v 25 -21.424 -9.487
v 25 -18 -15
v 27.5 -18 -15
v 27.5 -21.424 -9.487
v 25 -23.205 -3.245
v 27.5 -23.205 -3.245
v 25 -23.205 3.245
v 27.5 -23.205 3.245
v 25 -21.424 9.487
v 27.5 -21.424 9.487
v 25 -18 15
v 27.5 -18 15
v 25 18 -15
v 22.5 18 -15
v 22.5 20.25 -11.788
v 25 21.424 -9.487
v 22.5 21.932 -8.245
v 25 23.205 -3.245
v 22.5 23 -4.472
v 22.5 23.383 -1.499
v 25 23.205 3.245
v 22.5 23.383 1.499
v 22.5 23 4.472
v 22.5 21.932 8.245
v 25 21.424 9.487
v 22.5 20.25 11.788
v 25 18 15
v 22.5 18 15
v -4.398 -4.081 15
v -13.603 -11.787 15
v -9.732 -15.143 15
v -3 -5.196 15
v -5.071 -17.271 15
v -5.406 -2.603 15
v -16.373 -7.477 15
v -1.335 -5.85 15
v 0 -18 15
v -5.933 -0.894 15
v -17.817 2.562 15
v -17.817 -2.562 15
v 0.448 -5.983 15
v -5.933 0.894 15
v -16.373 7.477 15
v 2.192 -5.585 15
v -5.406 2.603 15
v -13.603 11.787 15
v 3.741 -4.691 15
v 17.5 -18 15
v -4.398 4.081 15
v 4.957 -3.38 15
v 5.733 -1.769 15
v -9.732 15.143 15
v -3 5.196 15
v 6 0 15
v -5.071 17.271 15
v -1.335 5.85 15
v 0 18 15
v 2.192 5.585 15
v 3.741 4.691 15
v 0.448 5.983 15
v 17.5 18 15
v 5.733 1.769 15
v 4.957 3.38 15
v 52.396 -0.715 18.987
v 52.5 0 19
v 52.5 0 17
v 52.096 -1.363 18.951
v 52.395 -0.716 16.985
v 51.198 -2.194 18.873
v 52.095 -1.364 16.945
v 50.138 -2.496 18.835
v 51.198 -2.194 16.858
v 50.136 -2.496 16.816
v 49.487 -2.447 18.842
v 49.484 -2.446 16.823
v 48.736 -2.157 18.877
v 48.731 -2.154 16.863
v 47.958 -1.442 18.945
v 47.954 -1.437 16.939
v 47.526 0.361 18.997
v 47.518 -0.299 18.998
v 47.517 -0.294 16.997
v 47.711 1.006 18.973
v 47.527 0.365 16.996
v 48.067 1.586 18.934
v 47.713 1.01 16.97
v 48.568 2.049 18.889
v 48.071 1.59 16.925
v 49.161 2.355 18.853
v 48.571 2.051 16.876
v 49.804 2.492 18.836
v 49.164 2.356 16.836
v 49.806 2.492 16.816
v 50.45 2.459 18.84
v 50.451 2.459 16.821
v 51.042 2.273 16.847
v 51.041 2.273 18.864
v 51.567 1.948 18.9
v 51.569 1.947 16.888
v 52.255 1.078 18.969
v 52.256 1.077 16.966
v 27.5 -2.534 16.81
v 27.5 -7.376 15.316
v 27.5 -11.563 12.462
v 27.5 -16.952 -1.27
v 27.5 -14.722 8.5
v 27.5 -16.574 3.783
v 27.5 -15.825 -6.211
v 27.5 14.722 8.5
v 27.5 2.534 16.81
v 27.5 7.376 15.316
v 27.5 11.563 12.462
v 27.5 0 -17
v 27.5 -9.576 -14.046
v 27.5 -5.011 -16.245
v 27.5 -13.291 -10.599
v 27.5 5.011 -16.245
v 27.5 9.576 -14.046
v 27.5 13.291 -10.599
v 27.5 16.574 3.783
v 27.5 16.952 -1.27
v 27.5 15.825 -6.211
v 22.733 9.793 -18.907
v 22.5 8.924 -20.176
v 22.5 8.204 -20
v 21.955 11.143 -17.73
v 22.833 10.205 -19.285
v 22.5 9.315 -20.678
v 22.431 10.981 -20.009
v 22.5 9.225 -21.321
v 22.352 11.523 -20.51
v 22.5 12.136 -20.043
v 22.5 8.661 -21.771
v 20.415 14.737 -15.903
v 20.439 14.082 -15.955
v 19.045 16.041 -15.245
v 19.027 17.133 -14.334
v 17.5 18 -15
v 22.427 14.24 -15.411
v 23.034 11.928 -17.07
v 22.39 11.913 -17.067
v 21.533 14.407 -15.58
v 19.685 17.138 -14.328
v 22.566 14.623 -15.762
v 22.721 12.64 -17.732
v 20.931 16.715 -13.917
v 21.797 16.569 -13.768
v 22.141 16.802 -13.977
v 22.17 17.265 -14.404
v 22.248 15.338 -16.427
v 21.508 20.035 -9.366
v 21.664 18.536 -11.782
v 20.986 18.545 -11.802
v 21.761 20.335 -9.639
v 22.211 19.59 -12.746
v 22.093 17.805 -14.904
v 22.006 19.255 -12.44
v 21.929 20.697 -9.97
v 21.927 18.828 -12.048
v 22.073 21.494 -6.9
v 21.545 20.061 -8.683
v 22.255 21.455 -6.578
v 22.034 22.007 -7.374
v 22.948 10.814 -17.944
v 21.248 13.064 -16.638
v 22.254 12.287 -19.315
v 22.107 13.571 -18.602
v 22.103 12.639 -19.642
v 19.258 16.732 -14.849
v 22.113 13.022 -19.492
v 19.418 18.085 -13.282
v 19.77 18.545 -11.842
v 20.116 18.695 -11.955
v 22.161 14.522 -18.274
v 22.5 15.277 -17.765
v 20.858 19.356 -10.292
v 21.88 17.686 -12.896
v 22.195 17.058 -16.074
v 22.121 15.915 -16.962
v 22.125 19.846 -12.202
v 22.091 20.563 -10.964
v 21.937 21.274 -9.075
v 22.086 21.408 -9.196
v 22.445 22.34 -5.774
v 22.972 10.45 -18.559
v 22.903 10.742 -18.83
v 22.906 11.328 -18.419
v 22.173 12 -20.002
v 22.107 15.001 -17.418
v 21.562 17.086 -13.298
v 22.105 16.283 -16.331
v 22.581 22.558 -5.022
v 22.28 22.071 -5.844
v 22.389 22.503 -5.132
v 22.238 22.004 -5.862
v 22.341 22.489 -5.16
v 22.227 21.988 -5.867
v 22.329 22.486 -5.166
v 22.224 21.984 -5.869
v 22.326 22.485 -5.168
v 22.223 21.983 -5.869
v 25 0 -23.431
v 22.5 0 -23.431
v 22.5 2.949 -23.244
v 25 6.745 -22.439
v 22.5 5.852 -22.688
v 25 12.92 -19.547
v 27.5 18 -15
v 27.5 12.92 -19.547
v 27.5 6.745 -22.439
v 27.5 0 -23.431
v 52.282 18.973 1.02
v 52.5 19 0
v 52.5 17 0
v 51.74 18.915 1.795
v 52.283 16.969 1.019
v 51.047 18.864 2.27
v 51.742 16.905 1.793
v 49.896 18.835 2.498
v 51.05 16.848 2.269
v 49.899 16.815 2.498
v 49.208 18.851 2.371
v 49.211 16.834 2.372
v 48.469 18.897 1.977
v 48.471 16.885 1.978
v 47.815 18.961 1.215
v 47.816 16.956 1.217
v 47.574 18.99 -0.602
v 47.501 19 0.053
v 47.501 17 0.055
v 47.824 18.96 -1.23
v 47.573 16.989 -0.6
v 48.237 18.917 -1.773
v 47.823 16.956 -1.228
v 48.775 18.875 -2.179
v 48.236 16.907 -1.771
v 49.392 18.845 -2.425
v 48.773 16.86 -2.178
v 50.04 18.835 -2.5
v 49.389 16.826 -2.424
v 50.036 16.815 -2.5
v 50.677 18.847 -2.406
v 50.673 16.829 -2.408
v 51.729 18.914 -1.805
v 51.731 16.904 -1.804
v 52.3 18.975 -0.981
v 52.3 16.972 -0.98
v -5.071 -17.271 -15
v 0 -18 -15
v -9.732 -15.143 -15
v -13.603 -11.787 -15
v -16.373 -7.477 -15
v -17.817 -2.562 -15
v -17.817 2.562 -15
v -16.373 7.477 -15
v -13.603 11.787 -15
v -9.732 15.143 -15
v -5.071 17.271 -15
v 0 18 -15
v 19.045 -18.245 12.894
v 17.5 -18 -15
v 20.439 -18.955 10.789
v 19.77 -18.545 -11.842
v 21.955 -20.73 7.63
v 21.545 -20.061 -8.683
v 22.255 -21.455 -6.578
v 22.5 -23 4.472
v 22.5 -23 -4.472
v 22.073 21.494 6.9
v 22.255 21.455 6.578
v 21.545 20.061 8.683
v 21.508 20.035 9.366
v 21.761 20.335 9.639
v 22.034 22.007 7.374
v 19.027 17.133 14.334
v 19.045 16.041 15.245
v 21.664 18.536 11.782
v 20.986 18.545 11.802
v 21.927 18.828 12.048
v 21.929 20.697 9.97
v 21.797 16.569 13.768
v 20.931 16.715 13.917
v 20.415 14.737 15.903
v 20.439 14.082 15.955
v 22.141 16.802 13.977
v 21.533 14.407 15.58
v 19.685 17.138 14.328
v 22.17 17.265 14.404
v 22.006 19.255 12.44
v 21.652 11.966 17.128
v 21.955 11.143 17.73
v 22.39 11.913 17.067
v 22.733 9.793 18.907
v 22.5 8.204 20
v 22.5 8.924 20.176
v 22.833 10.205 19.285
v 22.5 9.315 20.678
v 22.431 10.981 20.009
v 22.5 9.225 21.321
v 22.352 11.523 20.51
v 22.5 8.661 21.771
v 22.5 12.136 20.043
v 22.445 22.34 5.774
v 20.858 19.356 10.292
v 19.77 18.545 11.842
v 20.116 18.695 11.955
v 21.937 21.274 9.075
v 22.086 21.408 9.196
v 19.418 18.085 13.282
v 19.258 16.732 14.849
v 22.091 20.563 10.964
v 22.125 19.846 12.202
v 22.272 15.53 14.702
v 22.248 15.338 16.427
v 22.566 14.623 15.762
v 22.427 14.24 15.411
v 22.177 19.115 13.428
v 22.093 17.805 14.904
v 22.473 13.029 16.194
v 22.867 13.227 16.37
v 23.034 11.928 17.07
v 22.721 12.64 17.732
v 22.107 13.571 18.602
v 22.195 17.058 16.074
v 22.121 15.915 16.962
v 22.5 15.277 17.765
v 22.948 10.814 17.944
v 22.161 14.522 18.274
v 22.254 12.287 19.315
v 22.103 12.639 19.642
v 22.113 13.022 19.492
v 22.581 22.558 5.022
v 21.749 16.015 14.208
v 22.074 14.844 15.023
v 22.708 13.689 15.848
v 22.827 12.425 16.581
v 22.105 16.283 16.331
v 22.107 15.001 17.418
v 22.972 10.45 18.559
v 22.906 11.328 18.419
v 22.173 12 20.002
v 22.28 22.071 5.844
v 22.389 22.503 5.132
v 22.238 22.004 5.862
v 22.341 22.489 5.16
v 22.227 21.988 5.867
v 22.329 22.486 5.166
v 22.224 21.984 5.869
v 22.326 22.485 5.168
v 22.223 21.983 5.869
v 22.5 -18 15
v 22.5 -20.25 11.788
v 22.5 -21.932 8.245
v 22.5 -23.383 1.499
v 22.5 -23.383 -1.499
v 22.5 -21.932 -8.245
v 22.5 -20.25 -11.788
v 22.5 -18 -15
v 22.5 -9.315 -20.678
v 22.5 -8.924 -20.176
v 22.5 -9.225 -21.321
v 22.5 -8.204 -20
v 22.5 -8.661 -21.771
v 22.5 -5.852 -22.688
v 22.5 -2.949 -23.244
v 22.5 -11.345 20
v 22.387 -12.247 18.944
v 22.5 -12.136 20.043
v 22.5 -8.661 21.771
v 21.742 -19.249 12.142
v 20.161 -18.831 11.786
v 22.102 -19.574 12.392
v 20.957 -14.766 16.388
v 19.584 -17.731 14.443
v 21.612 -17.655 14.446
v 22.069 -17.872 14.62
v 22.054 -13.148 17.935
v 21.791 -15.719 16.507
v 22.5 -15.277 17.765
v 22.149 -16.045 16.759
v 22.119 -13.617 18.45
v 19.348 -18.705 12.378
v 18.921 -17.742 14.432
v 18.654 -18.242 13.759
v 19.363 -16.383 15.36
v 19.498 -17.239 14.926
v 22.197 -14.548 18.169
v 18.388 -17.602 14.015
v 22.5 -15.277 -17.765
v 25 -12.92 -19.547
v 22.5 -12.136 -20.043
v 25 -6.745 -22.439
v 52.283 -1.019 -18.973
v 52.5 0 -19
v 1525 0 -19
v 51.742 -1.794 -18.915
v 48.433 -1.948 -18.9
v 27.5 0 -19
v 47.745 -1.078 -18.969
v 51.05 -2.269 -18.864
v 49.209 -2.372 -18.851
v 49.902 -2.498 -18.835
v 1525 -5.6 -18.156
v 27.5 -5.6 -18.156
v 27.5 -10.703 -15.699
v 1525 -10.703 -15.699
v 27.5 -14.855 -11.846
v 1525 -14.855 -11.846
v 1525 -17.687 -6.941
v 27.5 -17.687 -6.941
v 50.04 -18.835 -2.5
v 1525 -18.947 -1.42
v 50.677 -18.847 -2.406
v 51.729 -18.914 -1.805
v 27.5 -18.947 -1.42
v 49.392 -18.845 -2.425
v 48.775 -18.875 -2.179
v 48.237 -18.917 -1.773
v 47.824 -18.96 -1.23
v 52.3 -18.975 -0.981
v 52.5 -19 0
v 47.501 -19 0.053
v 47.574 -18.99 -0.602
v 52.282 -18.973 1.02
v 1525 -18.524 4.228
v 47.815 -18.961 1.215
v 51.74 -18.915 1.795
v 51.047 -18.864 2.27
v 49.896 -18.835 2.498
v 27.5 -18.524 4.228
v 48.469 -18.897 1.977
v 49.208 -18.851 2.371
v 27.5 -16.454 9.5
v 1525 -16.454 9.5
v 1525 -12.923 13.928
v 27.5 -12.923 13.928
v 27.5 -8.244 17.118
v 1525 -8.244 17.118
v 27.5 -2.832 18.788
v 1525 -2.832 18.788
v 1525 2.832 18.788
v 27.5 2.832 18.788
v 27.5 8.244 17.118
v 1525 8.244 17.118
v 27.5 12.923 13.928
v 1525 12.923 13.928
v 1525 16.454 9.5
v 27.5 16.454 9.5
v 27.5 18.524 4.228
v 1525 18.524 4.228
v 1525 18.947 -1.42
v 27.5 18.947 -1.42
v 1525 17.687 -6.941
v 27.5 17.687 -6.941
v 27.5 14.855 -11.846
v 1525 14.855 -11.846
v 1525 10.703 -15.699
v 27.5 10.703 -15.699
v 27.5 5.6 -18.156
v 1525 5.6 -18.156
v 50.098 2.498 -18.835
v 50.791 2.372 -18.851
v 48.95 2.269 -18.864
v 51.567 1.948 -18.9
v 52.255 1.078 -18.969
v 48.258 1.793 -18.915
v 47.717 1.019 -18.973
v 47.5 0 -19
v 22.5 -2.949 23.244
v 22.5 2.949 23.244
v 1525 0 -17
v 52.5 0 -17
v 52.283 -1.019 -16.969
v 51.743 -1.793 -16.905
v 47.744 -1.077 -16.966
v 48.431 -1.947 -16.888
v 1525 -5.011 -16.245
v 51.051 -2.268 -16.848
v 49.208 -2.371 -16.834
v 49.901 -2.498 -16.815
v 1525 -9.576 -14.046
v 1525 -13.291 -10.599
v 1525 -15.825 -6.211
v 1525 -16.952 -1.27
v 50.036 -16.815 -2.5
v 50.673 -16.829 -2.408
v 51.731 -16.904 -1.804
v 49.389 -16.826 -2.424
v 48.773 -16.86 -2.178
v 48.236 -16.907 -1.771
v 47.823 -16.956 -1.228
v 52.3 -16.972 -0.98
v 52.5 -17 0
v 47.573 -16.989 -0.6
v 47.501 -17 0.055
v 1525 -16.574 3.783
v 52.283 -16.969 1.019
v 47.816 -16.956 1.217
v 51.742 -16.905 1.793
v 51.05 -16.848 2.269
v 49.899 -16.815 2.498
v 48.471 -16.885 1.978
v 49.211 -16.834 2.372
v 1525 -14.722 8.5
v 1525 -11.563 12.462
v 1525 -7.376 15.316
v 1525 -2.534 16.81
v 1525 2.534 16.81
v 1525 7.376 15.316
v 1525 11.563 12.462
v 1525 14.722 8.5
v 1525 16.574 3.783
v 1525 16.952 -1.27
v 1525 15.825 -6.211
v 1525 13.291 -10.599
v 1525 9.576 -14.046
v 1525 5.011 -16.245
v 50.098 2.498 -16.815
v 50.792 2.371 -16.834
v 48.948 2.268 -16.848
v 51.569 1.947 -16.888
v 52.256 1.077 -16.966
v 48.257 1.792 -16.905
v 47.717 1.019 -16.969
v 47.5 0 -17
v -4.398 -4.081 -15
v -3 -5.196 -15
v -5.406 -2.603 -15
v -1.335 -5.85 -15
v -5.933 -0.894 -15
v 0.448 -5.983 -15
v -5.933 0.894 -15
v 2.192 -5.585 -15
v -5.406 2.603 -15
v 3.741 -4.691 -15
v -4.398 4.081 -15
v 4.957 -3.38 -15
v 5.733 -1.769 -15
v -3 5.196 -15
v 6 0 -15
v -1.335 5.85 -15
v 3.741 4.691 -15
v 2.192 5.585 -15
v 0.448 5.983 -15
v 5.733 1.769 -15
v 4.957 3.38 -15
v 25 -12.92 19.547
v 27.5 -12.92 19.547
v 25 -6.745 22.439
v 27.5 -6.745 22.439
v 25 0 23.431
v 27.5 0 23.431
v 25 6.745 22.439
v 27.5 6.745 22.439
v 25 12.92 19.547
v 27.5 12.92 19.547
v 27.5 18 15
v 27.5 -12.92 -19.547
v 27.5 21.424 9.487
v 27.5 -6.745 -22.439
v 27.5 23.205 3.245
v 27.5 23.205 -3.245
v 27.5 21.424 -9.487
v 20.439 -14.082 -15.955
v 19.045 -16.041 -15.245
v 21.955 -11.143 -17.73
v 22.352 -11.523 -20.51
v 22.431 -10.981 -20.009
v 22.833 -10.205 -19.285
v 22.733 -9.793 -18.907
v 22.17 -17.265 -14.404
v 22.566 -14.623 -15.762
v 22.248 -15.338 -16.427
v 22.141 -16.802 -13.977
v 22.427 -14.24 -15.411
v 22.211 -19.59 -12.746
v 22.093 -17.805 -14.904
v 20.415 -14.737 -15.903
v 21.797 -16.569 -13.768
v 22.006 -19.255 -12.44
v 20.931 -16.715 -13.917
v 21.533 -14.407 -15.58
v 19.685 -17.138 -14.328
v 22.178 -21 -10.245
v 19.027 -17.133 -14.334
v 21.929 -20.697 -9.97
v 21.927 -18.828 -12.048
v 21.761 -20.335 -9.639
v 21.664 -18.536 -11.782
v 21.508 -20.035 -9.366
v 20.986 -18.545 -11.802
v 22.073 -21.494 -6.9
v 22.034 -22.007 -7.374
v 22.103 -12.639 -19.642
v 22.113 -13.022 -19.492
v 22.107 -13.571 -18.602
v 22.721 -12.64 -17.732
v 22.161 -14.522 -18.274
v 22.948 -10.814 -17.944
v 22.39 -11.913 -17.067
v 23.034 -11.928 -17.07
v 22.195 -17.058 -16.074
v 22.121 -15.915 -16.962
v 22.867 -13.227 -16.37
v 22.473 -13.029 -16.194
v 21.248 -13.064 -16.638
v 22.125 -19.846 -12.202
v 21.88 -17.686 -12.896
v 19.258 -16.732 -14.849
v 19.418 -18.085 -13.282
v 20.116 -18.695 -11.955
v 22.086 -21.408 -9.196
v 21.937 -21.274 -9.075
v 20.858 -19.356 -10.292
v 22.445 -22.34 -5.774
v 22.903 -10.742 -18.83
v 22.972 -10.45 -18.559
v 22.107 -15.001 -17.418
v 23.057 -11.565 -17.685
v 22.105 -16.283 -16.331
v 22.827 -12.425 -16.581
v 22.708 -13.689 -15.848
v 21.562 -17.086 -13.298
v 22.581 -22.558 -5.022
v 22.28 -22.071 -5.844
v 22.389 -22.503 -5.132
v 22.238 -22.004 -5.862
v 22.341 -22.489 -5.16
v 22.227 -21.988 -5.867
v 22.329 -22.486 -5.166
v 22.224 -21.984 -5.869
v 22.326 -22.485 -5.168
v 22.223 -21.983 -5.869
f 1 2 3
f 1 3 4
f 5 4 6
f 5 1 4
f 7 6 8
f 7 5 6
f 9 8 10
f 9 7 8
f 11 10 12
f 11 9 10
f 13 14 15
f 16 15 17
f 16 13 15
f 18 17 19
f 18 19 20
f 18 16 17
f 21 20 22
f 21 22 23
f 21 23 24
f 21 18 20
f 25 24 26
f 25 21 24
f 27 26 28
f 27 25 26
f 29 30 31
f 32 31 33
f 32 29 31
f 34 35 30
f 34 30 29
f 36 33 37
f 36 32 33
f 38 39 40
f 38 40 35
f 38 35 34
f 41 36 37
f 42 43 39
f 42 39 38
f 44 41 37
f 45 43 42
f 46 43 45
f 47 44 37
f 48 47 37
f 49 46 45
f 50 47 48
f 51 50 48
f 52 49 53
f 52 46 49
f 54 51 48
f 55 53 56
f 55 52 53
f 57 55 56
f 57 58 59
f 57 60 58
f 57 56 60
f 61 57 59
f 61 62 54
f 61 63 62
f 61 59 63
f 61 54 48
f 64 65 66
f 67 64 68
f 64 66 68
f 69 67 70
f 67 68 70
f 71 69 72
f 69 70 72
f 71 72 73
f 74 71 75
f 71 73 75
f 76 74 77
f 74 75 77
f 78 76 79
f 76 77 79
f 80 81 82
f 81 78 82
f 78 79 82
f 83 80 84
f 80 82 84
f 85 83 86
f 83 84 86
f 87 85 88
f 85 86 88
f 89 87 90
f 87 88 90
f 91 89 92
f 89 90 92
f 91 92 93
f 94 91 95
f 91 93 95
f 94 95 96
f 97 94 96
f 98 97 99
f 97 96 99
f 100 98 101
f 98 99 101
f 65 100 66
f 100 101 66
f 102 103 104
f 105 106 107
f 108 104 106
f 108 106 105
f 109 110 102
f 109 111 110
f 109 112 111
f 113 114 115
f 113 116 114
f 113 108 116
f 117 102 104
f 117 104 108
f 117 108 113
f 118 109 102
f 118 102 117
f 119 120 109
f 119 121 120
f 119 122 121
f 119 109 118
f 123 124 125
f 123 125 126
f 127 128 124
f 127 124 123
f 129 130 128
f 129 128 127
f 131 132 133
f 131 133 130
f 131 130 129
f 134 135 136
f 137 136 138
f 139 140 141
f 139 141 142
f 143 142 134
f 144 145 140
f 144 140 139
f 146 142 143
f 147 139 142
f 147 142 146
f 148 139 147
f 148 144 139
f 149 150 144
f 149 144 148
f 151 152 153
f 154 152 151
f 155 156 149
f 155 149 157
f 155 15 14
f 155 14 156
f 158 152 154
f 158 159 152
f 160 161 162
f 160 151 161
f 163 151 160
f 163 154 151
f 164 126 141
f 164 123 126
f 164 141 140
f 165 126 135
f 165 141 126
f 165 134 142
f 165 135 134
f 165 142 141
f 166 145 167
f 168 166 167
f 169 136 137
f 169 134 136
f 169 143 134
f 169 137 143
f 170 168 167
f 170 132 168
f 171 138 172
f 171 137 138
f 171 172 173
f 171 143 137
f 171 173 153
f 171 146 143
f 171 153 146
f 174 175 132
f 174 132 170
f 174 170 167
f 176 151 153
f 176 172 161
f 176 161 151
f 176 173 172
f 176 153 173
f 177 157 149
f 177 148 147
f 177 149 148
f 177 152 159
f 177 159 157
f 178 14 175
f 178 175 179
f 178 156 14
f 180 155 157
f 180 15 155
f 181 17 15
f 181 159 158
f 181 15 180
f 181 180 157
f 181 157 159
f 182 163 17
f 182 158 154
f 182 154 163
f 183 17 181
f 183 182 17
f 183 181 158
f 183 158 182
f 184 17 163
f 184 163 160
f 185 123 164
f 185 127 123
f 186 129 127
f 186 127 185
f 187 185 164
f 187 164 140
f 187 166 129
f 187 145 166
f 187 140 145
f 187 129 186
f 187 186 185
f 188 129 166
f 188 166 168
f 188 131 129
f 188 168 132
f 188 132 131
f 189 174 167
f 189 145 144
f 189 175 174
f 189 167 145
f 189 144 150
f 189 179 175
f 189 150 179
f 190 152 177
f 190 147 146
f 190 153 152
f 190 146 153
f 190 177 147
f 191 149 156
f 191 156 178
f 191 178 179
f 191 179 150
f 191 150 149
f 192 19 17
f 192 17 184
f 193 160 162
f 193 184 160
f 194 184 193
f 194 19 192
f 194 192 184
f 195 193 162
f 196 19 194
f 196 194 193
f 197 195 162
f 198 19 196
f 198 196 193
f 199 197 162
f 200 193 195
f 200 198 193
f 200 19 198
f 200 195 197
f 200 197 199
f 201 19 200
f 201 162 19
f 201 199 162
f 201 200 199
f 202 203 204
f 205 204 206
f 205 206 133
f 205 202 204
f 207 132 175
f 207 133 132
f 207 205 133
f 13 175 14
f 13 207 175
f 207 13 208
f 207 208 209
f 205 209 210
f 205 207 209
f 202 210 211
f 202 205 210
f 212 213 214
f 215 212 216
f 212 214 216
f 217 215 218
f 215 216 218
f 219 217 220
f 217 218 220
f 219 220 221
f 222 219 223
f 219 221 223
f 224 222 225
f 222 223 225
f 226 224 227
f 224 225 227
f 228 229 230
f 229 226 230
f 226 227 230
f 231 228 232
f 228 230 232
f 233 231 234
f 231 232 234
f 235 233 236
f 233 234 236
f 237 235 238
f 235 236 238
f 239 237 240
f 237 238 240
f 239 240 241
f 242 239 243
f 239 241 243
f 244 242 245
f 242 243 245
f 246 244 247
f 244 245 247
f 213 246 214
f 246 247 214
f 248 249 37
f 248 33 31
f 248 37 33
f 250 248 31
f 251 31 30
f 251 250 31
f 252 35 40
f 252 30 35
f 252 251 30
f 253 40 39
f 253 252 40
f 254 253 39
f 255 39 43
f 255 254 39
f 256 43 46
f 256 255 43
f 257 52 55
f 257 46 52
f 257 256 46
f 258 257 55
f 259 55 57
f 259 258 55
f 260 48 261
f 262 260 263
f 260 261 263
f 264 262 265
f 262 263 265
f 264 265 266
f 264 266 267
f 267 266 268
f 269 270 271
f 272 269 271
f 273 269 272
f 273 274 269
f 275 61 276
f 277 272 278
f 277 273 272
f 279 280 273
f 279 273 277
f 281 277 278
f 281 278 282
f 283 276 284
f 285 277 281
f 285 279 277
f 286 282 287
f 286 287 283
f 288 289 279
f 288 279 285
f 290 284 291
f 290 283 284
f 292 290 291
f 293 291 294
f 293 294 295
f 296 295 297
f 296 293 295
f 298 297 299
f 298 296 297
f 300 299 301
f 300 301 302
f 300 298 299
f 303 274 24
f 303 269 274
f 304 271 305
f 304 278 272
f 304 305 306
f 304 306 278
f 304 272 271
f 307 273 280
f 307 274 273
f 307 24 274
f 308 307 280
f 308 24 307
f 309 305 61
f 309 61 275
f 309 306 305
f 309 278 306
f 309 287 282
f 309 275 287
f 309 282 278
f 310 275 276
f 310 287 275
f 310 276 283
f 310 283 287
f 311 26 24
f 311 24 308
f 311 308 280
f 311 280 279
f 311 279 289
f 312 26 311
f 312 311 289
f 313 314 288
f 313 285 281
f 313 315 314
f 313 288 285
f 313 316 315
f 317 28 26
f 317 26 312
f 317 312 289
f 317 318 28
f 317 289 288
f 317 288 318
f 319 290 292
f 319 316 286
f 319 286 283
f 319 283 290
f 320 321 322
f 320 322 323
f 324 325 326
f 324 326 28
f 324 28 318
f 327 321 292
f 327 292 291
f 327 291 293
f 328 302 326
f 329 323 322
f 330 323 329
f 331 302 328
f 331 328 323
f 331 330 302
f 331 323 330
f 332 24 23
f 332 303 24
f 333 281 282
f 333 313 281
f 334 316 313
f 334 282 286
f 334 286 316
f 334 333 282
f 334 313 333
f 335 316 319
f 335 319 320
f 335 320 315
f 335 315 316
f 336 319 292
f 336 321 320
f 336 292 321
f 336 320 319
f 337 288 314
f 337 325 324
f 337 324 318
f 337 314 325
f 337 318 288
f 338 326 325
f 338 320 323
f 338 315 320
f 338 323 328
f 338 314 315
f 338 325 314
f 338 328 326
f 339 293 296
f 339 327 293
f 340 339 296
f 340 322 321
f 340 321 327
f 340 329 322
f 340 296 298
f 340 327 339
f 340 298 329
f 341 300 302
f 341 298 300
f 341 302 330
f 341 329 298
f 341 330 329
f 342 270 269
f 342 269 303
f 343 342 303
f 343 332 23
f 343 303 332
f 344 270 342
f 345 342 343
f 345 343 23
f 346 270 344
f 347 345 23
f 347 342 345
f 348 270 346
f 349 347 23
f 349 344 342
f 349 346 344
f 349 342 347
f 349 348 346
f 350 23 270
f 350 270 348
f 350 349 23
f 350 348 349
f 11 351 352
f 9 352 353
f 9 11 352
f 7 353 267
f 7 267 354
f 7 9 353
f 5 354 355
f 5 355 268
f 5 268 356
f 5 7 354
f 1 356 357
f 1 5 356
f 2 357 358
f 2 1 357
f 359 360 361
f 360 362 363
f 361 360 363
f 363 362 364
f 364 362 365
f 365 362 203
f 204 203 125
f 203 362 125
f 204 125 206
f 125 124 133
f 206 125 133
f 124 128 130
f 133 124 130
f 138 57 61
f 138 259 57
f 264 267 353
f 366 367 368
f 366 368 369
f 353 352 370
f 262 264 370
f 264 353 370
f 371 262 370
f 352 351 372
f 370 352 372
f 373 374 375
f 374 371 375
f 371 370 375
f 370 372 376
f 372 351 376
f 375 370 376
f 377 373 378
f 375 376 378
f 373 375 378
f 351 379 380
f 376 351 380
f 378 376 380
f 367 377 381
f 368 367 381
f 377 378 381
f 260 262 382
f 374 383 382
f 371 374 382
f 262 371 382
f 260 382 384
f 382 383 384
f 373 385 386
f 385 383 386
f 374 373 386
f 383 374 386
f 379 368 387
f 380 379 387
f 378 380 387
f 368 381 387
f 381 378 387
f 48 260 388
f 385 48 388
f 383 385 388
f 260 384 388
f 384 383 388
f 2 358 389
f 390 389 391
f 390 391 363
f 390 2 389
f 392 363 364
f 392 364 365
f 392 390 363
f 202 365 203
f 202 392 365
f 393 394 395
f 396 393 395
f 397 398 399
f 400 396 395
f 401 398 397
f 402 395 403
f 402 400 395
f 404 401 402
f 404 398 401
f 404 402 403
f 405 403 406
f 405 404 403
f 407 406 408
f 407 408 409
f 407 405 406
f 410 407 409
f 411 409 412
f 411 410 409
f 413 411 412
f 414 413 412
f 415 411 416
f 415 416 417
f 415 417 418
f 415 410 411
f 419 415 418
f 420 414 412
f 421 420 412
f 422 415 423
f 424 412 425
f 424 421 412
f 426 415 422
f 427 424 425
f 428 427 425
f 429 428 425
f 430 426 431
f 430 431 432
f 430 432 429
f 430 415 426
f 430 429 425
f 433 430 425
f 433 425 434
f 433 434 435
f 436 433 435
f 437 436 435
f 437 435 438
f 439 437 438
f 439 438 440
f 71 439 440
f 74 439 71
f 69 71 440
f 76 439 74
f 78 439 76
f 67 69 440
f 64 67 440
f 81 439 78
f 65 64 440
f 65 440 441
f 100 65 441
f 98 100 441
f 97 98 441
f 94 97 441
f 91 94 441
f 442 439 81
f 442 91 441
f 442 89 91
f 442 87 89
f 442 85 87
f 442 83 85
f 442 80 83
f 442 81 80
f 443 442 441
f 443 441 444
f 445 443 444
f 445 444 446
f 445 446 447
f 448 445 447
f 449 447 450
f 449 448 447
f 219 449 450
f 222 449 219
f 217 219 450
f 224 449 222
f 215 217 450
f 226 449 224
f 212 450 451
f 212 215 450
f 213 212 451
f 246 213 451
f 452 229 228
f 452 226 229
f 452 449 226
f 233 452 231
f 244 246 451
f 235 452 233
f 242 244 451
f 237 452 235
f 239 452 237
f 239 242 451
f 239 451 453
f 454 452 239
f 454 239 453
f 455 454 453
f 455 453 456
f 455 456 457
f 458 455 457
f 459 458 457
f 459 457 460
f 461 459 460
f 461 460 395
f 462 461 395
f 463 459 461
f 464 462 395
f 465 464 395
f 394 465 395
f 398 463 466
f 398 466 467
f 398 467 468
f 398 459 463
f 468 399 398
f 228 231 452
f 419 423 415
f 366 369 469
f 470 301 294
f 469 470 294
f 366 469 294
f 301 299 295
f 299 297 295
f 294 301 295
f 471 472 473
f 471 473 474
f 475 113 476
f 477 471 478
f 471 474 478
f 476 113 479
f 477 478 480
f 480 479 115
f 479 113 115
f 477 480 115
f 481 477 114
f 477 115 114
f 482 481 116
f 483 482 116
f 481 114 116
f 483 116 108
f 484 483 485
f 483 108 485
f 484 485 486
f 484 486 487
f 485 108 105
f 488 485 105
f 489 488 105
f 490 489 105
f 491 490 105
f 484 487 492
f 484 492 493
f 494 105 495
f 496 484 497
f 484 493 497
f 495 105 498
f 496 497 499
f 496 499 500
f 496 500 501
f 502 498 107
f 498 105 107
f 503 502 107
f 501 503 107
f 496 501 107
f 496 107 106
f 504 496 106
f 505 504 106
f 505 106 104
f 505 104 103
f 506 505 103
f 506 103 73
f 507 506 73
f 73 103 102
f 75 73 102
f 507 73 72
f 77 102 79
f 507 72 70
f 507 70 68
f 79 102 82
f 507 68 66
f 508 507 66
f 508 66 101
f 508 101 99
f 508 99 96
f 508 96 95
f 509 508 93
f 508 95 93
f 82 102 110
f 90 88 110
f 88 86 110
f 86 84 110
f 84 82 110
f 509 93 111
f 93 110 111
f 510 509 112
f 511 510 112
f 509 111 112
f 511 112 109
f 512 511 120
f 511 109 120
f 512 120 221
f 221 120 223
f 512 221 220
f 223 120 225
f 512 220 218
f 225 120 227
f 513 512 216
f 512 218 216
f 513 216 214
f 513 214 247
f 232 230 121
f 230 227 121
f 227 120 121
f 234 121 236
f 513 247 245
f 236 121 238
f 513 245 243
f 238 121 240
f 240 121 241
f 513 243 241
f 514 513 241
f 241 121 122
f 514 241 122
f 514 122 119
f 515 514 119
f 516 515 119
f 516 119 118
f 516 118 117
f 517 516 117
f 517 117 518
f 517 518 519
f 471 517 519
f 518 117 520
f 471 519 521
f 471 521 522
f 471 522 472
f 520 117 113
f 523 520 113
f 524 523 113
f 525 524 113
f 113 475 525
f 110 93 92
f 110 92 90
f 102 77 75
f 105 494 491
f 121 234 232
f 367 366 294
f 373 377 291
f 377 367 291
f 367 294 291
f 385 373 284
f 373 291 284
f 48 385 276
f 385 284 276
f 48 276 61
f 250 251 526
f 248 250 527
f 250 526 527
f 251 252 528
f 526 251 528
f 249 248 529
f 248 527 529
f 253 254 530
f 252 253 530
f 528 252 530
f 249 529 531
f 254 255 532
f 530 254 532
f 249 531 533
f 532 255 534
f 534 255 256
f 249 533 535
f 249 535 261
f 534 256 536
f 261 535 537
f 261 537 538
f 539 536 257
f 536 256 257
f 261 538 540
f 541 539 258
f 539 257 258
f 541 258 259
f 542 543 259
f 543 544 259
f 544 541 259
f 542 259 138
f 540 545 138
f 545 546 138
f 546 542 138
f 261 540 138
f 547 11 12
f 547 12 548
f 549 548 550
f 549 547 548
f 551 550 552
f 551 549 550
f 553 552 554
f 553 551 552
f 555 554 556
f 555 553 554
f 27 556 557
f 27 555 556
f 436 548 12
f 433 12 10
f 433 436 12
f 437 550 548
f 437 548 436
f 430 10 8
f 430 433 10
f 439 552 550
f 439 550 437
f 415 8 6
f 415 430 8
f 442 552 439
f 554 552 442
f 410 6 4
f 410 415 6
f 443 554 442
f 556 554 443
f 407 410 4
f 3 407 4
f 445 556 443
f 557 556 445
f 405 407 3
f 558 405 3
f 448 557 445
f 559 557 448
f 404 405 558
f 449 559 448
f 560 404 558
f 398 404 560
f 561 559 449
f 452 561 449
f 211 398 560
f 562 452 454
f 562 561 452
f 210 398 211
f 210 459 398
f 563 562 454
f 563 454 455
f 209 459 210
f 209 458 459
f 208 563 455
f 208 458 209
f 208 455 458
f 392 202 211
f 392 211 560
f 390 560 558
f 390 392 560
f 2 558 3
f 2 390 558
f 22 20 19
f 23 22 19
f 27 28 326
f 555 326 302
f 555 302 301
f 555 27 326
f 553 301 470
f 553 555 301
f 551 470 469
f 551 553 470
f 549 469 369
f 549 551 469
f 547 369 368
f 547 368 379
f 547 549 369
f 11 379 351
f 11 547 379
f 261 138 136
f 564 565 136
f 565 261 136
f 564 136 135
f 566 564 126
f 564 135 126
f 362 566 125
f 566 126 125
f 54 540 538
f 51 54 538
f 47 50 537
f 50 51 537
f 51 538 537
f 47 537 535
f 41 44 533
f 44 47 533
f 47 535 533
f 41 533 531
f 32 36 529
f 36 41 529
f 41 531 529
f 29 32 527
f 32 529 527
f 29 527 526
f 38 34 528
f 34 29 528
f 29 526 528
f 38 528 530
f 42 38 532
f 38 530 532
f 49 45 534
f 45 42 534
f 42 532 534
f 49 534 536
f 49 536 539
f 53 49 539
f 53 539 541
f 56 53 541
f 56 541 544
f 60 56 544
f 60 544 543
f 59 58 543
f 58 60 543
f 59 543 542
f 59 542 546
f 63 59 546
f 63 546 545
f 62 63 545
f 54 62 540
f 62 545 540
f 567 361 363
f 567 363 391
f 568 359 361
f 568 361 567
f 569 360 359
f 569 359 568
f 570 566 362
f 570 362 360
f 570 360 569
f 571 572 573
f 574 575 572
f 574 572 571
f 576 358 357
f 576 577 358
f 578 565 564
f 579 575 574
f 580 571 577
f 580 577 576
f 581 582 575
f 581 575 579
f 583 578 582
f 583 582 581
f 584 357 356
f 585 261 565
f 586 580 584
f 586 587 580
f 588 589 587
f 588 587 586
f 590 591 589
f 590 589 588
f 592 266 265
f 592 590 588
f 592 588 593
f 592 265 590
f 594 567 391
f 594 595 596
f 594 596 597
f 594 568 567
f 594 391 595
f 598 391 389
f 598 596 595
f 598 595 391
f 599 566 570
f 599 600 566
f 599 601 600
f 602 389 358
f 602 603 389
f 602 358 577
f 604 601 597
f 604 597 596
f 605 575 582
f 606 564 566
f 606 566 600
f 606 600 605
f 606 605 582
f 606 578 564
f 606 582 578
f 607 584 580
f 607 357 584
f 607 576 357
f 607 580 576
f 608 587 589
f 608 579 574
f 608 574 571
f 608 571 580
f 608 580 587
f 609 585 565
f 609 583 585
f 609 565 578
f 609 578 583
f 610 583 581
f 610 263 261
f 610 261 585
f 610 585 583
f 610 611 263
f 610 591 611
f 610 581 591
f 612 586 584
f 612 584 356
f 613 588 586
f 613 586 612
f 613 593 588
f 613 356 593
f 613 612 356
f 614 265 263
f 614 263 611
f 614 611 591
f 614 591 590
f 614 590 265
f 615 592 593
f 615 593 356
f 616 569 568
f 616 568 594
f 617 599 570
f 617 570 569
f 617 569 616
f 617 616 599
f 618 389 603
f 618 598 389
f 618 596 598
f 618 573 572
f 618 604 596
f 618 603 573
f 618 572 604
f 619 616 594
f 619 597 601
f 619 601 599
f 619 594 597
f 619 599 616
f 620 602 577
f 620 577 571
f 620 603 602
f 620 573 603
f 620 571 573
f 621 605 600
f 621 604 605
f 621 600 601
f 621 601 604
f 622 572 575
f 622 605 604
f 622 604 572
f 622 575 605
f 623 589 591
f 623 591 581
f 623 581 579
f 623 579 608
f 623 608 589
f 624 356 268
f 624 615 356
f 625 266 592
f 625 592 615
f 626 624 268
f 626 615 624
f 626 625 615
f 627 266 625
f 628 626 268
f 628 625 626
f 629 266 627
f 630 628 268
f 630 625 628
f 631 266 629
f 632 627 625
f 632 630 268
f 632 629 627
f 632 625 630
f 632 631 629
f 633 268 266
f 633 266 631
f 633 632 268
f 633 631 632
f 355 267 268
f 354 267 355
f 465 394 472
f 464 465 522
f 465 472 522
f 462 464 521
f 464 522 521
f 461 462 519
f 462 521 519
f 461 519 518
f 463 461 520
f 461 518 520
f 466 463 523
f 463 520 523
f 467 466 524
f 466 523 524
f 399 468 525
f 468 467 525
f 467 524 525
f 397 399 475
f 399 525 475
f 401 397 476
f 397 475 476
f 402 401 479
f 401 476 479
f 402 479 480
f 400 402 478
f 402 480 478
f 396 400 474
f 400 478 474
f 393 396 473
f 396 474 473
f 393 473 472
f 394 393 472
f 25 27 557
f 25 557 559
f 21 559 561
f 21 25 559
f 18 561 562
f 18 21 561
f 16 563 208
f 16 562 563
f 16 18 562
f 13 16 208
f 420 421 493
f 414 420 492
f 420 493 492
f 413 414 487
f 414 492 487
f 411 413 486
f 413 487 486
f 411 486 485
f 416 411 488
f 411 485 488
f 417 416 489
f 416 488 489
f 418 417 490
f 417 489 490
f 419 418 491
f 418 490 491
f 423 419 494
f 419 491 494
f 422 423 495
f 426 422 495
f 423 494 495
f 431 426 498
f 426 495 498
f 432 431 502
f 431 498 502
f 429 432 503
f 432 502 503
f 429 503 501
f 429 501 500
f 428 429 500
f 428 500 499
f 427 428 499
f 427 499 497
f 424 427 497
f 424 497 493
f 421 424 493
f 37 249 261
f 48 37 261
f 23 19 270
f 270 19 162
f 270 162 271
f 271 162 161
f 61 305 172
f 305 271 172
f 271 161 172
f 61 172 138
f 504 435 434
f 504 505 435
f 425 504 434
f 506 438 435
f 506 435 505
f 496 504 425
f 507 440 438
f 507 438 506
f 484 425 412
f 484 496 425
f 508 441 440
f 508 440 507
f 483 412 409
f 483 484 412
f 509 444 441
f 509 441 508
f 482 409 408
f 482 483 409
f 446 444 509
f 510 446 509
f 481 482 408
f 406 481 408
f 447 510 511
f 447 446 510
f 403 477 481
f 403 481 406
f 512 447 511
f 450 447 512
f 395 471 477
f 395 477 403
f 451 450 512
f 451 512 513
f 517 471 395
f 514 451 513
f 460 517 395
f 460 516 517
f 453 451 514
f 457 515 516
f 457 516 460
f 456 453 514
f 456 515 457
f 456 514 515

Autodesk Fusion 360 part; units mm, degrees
sketch "Sketch1" plane through (0, 0, 0) normal (0, 0, 1) x (1, 0, 0)
  circle A0 centre (0, 0) radius 6
  line L0 (0, 0) -> (0, 49.4759) construction
  line L1 (0, 0) -> (0, -54.6862) construction
  arc A1 (0, 18) -> (0, -18) centre (0, 0) ccw
  line L2 (0, 18) -> (25, 18)
  line L3 (0, -18) -> (25, -18)
  line L4 (25, 18) -> (25, -18)
  dimension "d1" = 36
  dimension "d2" = 12
  dimension "d4" = 25
  dimension "d5" = 25
extrude "Extrude1" add sketch "Sketch1" along normal mid plane 30
sketch "Sketch2" plane through (25, 0, 0) normal (1, 0, 0) x (0, 0, -1)
  line L0 (15, 18) -> (-15, 18)
  line L1 (-15, 18) -> (-15, -18)
  line L2 (-15, -18) -> (15, -18)
  line L3 (15, -18) -> (15, 18)
  circle A0 centre (0, 0) radius 19
  circle A1 centre (0, 0) radius 17
  dimension "d8" = 38
  dimension "d9" = 34
extrude "Extrude2" add sketch "Sketch2" along normal blind 1500 contours L0 L1 L3 A0 A1 | L0 A0 | L3 A0 A1 | L1 A0 A1 | L1 L2 L3 A0 A1 | L2 A0
ref_plane "WorkPlane1" through (25, 0, 0) normal (1, 0, 0) x (0, 1, 0)
sketch "Sketch3" plane through (25, 0, 0) normal (1, 0, 0) x (0, 0, -1)
  line L0 (-6.0828, 18) -> (-15, 18)
  line L1 (-15, 11.6619) -> (-15, 18)
  line L2 (15, 18) -> (6.0828, 18)
  line L3 (15, 18) -> (15, 11.6619)
  line L4 (-6.0828, -18) -> (-15, -18)
  line L5 (-15, -18) -> (-15, -11.6619)
  line L6 (15, -18) -> (6.0828, -18)
  line L7 (15, -11.6619) -> (15, -18)
  circle A0 centre (0, 0) radius 23.4307
extrude "Extrude3" add sketch "Sketch3" along normal mid plane 5
fillet "Fillet1" radius 5 4 edges at (22.5, 18, 0) (22.5, 0, 15) (22.5, -18, 0) (22.5, 0, -15)
sketch "Sketch4" plane through (0, 0, 0) normal (0, 1, 0) x (1, 0, 0)
  line L0 (0, 0) -> (50, 0) construction
  circle A0 centre (50, 0) radius 2.5
  dimension "d16" = 50
  dimension "d17" = 5
extrude "Extrude4" cut sketch "Sketch4" along normal through all and the other way through all
sketch "Sketch5" plane through (0, 0, 0) normal (0, 0, 1) x (1, 0, 0)
  line L0 (0, 0) -> (50, 0) construction
  circle A0 centre (50, 0) radius 2.5
  dimension "d20" = 50
  dimension "d21" = 5
extrude "Extrude5" cut sketch "Sketch5" along normal through all and the other way through all
equation "d1 = ( 18 * 2 ) * 1 mm"
